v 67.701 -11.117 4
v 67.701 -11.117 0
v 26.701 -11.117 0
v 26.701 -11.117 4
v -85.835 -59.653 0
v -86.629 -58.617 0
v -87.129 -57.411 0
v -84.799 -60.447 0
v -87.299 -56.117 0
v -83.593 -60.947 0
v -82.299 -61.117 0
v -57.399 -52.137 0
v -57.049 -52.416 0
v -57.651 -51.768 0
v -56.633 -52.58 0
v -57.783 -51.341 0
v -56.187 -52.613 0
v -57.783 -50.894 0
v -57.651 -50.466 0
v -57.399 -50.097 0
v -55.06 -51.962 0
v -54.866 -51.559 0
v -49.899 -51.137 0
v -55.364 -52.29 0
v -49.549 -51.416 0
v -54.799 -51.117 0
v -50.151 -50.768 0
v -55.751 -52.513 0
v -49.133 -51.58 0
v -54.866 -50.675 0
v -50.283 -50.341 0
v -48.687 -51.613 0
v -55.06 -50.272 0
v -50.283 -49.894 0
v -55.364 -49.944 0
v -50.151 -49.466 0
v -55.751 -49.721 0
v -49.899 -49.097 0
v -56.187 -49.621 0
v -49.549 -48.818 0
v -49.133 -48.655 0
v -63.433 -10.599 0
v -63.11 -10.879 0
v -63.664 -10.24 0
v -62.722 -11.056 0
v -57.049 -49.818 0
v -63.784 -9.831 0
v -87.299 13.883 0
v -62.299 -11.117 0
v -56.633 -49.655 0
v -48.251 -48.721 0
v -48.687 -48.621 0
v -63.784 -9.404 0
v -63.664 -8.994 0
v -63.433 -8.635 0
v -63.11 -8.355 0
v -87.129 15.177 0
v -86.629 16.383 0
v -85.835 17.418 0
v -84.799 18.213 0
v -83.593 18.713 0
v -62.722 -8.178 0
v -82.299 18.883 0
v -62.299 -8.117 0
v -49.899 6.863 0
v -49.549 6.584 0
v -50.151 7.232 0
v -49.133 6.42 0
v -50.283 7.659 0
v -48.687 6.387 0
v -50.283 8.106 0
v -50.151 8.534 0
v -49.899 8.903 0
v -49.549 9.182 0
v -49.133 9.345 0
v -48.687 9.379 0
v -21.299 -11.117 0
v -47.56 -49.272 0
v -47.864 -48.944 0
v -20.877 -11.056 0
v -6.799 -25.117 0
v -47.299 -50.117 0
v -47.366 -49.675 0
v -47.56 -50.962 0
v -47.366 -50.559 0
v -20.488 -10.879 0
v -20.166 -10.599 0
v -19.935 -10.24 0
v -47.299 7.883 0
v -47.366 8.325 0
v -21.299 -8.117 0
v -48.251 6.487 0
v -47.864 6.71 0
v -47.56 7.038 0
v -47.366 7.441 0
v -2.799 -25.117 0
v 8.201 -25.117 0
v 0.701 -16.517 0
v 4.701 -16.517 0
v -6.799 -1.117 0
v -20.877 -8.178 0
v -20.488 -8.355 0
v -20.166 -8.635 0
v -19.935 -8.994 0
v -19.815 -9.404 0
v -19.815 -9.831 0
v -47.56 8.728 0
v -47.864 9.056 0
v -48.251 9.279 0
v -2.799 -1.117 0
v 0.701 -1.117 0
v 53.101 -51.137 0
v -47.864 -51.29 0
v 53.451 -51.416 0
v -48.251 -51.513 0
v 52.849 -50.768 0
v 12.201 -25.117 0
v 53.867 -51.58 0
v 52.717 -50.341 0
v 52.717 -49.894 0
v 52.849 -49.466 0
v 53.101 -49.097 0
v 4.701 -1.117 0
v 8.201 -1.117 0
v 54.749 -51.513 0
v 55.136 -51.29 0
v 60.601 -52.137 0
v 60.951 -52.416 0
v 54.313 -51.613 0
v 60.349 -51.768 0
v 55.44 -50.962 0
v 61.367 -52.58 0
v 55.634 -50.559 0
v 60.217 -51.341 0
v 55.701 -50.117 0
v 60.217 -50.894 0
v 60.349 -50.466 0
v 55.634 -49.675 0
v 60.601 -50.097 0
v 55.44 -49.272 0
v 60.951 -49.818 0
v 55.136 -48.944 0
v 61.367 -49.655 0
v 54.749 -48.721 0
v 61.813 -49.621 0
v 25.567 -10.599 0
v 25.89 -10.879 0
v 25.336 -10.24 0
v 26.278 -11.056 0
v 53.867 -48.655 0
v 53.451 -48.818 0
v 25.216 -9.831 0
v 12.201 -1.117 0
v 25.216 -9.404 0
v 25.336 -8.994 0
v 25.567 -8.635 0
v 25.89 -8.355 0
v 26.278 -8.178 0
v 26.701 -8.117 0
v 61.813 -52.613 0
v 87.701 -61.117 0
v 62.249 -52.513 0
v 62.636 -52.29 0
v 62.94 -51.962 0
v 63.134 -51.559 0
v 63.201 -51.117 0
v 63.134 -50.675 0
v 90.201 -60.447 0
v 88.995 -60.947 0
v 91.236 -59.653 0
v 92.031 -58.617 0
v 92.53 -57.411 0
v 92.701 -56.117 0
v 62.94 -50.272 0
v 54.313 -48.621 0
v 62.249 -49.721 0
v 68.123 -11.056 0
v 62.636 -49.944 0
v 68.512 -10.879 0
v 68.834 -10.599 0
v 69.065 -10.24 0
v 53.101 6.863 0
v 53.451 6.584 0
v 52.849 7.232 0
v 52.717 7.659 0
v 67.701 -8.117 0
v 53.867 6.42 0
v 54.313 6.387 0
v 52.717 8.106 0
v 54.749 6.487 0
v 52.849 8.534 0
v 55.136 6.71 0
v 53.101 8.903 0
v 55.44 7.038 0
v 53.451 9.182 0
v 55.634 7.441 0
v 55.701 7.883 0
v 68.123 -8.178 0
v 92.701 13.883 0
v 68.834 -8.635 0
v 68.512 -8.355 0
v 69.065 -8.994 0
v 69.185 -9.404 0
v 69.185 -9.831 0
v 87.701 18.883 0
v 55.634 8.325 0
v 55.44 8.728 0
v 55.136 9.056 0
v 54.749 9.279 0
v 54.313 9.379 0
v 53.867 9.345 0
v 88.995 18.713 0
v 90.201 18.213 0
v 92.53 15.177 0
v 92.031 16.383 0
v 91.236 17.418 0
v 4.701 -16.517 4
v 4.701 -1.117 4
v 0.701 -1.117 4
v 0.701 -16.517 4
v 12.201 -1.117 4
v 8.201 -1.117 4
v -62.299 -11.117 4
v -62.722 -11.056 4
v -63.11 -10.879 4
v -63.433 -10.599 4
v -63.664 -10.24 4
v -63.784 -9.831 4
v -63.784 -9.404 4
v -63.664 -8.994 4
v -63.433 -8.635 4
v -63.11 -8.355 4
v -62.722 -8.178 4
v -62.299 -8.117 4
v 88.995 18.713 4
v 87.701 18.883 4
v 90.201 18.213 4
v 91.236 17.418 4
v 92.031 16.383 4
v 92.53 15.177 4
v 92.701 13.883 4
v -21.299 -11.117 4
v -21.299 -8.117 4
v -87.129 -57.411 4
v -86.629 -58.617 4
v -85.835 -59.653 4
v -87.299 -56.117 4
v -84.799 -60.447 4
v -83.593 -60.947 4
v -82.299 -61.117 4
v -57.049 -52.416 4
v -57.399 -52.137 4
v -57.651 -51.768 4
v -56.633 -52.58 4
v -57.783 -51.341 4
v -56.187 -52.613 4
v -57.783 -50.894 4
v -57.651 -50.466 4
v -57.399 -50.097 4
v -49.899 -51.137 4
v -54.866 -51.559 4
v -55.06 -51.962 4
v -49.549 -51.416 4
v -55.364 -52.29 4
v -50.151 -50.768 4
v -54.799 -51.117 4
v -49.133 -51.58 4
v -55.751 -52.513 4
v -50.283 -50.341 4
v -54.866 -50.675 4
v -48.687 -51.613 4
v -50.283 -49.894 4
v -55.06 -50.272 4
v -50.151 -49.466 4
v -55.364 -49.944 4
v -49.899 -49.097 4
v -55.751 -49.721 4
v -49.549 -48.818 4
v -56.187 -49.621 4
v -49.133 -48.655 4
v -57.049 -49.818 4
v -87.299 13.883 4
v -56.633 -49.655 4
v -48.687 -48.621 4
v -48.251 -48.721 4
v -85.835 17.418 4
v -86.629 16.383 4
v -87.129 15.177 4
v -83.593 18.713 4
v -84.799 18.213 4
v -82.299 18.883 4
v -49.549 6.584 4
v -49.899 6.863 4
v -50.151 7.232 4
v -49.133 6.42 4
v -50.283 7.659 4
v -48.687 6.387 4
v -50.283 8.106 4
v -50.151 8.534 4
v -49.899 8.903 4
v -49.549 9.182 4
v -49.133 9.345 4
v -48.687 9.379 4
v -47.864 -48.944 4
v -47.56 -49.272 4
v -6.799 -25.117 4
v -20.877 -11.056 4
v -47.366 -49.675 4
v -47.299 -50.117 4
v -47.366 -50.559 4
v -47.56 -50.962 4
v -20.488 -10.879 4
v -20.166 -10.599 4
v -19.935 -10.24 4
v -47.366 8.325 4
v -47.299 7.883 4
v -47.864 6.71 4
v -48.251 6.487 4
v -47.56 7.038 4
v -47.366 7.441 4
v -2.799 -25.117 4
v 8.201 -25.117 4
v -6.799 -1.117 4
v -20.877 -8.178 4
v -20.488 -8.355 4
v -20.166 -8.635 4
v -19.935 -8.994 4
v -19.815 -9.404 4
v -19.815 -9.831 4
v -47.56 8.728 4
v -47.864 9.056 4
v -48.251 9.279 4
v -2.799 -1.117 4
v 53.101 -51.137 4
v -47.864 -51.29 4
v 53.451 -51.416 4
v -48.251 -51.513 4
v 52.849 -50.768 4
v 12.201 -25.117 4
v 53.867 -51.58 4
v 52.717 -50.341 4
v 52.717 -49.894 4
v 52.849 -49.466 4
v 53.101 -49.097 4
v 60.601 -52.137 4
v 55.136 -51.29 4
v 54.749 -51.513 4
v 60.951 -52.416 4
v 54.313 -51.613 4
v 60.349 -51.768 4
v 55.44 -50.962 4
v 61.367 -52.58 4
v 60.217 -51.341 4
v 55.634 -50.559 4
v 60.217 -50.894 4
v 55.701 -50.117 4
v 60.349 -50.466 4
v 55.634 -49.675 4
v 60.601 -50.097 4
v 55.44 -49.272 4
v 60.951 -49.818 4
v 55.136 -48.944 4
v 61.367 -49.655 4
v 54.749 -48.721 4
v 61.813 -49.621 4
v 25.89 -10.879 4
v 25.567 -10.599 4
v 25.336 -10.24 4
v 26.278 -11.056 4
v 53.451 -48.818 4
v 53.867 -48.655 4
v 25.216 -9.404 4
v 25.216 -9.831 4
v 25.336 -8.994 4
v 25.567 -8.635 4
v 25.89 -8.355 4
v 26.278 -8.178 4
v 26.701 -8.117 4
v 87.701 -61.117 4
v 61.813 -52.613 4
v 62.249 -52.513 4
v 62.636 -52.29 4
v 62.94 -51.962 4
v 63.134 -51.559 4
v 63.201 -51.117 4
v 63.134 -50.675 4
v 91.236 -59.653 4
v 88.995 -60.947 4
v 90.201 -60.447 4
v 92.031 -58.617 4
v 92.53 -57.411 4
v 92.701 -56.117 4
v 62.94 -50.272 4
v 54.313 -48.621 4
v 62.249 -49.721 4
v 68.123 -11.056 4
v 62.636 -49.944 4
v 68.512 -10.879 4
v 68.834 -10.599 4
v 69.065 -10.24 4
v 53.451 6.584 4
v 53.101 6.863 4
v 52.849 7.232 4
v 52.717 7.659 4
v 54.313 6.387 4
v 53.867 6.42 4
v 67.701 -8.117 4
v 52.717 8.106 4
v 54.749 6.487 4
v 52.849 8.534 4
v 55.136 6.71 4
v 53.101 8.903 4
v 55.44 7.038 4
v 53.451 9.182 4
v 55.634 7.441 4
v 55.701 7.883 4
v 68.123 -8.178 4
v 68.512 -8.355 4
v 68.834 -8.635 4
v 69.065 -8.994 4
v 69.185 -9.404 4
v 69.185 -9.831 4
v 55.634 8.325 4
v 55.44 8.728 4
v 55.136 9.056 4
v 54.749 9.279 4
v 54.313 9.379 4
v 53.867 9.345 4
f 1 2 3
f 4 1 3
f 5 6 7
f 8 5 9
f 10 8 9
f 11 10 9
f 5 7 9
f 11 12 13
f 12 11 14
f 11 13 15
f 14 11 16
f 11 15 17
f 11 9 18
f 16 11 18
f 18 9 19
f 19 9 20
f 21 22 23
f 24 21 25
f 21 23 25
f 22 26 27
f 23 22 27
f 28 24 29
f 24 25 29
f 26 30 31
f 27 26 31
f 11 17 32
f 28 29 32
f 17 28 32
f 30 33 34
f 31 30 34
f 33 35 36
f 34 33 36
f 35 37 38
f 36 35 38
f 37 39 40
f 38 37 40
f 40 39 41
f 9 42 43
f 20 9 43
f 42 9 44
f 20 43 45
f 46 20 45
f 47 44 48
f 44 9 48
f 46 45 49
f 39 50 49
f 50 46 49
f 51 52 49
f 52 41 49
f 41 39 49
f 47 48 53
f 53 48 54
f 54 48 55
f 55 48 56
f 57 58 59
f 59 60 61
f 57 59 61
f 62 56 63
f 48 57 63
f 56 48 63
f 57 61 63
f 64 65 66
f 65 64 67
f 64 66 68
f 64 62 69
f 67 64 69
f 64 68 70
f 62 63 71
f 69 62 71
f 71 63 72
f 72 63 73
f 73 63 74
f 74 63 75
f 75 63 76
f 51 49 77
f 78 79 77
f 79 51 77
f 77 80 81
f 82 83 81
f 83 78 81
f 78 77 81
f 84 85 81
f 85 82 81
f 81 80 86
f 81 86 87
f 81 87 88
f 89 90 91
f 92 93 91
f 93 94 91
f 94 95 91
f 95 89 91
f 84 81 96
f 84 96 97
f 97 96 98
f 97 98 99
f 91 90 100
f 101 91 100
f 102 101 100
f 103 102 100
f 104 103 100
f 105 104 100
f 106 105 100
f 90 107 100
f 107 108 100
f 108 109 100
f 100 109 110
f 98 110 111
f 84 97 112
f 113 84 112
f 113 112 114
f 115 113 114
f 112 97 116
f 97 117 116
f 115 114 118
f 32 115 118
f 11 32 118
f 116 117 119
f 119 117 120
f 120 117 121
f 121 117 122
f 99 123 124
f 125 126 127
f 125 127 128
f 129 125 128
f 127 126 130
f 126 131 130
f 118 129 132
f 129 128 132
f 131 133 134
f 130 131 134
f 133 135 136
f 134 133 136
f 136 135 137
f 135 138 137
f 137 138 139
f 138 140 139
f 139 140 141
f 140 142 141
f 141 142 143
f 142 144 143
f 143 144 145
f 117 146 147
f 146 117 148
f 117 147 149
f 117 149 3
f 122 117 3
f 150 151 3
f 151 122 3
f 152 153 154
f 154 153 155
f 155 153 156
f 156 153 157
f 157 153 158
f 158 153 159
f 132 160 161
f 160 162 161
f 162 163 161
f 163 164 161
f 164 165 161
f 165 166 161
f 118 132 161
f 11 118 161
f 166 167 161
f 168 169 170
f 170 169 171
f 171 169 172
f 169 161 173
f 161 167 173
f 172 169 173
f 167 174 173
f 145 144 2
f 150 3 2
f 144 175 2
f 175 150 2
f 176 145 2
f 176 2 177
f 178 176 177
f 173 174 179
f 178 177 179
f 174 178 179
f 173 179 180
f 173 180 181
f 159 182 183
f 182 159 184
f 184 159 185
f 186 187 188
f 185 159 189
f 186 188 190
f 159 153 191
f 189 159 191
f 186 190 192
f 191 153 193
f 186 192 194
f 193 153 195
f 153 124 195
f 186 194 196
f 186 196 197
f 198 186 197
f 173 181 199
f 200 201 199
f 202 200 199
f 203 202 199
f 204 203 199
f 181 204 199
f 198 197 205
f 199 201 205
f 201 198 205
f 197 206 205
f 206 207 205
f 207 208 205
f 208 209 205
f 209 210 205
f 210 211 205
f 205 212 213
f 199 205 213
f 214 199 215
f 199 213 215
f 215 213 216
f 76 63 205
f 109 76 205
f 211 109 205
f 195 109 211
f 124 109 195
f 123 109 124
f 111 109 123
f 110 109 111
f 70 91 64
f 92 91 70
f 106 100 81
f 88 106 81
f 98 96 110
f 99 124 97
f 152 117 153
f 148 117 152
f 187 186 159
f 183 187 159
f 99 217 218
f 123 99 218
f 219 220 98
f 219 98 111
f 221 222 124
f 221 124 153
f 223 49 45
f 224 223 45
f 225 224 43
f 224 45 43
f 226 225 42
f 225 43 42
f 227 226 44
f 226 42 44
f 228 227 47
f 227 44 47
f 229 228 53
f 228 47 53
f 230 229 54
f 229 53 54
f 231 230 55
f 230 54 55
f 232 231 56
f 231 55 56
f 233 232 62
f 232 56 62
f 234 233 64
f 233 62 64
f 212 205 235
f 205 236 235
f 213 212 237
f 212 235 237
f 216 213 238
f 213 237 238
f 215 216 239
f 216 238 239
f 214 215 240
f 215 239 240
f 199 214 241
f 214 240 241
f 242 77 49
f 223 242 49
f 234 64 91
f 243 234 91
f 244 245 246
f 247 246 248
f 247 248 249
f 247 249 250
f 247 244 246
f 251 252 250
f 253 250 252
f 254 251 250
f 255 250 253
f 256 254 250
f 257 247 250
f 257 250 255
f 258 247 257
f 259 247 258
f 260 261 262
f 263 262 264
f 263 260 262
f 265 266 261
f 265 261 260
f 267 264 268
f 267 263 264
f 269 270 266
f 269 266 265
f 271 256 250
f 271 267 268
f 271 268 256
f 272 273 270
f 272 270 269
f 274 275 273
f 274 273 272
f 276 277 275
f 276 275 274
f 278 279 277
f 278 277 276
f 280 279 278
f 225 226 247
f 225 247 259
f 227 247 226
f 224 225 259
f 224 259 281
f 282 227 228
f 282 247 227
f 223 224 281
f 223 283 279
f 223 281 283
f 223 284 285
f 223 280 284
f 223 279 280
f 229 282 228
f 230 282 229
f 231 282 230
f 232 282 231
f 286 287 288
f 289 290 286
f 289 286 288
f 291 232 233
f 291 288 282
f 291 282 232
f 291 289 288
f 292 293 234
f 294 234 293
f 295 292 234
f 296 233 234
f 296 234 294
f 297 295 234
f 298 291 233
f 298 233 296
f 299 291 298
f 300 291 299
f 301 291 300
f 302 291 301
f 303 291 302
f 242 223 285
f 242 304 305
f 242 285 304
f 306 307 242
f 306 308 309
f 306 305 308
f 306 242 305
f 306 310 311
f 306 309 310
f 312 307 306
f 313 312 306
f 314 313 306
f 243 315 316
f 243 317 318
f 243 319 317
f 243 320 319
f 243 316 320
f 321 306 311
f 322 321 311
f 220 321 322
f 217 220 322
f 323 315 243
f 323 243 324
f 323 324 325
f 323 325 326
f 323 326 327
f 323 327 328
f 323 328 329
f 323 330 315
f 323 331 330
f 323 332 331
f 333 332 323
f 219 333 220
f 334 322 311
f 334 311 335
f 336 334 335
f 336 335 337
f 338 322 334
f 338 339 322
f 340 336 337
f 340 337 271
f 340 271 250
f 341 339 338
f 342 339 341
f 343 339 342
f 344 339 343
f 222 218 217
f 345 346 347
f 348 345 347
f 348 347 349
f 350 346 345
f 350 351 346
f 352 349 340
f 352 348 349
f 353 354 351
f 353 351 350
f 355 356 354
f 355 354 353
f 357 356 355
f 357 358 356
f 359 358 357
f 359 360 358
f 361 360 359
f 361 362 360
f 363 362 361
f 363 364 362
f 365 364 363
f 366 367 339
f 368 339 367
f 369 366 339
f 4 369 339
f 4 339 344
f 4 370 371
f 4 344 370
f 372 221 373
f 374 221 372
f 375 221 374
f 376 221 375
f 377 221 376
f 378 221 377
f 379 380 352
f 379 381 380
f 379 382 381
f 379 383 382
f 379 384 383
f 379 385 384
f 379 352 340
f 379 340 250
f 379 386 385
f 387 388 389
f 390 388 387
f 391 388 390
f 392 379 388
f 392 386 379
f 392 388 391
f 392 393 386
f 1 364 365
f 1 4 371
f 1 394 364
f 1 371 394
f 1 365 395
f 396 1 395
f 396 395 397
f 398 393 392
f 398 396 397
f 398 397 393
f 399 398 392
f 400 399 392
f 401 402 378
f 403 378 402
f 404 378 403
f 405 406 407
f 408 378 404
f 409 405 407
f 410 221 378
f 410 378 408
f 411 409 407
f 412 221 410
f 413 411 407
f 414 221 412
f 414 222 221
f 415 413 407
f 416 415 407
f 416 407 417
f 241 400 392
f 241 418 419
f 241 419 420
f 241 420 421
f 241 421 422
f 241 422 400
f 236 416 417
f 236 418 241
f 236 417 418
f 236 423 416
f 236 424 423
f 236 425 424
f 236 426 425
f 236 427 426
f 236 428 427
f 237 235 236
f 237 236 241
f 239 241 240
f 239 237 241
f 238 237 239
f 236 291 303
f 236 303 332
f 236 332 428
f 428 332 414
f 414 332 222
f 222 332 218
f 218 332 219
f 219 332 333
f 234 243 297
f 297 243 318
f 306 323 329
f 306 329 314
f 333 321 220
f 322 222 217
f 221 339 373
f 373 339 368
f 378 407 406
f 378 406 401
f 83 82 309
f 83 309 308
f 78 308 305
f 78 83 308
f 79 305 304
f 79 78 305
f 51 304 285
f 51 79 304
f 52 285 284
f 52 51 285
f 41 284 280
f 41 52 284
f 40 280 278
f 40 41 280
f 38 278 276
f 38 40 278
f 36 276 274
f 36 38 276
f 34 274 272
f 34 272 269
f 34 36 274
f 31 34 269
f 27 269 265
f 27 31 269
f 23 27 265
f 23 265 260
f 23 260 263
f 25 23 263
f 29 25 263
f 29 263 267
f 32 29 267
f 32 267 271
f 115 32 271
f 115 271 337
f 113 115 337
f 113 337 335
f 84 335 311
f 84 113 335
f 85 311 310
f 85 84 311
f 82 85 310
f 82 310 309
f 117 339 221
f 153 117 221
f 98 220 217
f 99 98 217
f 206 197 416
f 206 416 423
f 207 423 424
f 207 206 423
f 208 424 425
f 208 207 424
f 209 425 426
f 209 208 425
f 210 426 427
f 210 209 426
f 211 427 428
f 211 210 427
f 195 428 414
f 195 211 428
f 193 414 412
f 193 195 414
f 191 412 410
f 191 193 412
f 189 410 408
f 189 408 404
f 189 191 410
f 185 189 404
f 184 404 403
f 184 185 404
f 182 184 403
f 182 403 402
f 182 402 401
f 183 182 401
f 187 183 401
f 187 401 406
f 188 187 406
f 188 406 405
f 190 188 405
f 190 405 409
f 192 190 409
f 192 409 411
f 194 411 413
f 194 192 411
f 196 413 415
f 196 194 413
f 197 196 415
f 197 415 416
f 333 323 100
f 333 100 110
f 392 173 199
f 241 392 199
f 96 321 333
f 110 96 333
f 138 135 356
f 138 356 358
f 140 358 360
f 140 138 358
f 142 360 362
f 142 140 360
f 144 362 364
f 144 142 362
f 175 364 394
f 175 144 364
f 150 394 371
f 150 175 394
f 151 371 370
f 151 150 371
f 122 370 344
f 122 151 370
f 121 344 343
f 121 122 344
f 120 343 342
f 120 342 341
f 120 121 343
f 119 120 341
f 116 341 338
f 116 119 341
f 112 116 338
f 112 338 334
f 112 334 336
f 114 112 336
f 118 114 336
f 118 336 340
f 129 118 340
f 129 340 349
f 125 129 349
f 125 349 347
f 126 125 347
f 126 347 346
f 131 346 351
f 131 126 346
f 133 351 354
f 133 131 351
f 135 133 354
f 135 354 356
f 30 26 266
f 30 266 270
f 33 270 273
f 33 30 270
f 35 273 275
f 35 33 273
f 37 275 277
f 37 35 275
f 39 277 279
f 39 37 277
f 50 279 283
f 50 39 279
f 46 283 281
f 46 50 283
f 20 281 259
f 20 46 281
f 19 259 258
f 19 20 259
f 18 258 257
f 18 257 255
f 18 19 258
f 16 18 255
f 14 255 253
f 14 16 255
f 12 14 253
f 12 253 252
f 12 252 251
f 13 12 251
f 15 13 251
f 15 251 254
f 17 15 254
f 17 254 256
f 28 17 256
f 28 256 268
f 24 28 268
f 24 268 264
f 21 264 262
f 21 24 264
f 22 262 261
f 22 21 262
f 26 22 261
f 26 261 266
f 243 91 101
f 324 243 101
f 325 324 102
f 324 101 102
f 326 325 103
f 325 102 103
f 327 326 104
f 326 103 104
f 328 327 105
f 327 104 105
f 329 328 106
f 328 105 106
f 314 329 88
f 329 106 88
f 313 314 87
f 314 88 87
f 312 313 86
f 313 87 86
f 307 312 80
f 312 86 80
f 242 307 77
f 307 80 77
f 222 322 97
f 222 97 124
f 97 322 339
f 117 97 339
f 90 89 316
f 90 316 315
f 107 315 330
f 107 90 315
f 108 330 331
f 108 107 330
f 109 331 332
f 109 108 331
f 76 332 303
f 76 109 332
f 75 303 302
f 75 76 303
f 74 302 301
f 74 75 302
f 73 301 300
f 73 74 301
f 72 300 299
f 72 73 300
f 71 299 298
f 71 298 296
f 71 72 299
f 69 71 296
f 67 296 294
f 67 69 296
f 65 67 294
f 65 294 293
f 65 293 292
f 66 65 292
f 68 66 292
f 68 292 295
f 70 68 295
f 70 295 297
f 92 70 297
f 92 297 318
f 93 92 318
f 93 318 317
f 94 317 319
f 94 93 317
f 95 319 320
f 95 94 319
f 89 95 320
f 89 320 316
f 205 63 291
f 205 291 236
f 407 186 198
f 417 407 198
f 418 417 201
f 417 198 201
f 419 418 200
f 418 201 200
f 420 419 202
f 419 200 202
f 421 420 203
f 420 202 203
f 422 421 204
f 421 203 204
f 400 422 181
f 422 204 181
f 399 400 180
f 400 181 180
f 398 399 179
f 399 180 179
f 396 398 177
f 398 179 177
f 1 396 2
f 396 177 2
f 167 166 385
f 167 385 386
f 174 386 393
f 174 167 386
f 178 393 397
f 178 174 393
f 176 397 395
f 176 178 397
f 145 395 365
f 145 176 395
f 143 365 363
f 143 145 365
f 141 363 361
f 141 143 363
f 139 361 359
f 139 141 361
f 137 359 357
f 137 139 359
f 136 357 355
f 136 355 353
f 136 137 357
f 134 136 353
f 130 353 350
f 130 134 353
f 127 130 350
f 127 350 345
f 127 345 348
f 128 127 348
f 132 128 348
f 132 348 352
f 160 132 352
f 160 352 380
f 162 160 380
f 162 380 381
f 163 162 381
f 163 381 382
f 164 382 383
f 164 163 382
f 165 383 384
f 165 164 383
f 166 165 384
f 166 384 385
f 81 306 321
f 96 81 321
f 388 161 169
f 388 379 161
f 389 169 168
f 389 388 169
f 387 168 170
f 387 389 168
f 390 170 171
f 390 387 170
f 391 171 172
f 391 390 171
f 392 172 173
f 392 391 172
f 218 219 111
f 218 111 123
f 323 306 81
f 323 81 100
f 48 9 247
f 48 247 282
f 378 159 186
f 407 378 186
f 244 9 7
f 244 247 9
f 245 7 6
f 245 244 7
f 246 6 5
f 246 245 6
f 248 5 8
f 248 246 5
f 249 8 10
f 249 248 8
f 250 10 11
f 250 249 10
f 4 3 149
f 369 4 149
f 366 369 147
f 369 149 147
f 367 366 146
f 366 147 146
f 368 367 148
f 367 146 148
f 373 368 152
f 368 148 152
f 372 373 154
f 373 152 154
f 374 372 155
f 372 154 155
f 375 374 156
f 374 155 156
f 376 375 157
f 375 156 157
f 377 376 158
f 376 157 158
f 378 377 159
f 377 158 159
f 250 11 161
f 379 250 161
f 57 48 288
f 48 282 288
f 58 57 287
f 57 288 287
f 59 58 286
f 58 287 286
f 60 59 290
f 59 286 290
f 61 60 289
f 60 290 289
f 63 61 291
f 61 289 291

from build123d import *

# Parameters (mm, degrees)
SKETCH1_W           = 180
SKETCH1_H           = 80
SKETCH1_R           = 1.5
BOSS_EXTRUDE1_DEPTH = 4
SKETCH2_W           = 4
SKETCH2_H           = 24
SKETCH2_H_2         = 15.4
CUT_EXTRUDE1_DEPTH  = 4
FILLET1_R           = 5


with BuildPart() as part:
    # Sketch1 → Boss-Extrude1 (new body)
    with BuildSketch(Plane.XY):
        with Locations((2.700642055, -21.117125984)):
            Rectangle(SKETCH1_W, SKETCH1_H)
        with Locations((61.700642055, -51.117125984)):
            Circle(SKETCH1_R, mode=Mode.SUBTRACT)
        with Locations((-56.299357945, -51.117125984)):
            Circle(SKETCH1_R, mode=Mode.SUBTRACT)
        with Locations((-48.799357945, 7.882874016)):
            Circle(SKETCH1_R, mode=Mode.SUBTRACT)
        with Locations((54.200642055, 7.882874016)):
            Circle(SKETCH1_R, mode=Mode.SUBTRACT)
        with Locations((54.200642055, -50.117125984)):
            Circle(SKETCH1_R, mode=Mode.SUBTRACT)
        with Locations((-48.799357945, -50.117125984)):
            Circle(SKETCH1_R, mode=Mode.SUBTRACT)
        with BuildLine():
            Line((-62.299357945, -8.117125984), (-21.299357945, -8.117125984))
            ThreePointArc((-21.299357945, -8.117125984), (-19.799357945, -9.617125984), (-21.299357945, -11.117125984))
            Line((-21.299357945, -11.117125984), (-62.299357945, -11.117125984))
            ThreePointArc((-62.299357945, -11.117125984), (-63.799357945, -9.617125984), (-62.299357945, -8.117125984))
        make_face(mode=Mode.SUBTRACT)
        with BuildLine():
            Line((26.700642055, -8.117125984), (67.700642055, -8.117125984))
            ThreePointArc((67.700642055, -8.117125984), (69.200642055, -9.617125984), (67.700642055, -11.117125984))
            Line((67.700642055, -11.117125984), (26.700642055, -11.117125984))
            ThreePointArc((26.700642055, -11.117125984), (25.200642055, -9.617125984), (26.700642055, -8.117125984))
        make_face(mode=Mode.SUBTRACT)
    extrude(amount=BOSS_EXTRUDE1_DEPTH)

    # Sketch2 → Cut-Extrude1 (cut)
    with BuildSketch(Plane.XY.offset(4)):
        with Locations((-4.799357945, -13.117125984)):
            Rectangle(SKETCH2_W, SKETCH2_H)
        with Locations((2.700642055, -8.817125984)):
            Rectangle(SKETCH2_W, SKETCH2_H_2)
        with Locations((10.200642055, -13.117125984)):
            Rectangle(SKETCH2_W, SKETCH2_H)
    extrude(amount=-CUT_EXTRUDE1_DEPTH, mode=Mode.SUBTRACT)

    # Fillet1
    fillet1_edges = [part.edges().sort_by_distance(p)[0] for p in [
        (-87.299357945, 18.882874016, 2),
        (92.700642055, 18.882874016, 2),
        (92.700642055, -61.117125984, 2),
        (-87.299357945, -61.117125984, 2),
    ]]
    fillet(fillet1_edges, radius=FILLET1_R)


solid = part.part
